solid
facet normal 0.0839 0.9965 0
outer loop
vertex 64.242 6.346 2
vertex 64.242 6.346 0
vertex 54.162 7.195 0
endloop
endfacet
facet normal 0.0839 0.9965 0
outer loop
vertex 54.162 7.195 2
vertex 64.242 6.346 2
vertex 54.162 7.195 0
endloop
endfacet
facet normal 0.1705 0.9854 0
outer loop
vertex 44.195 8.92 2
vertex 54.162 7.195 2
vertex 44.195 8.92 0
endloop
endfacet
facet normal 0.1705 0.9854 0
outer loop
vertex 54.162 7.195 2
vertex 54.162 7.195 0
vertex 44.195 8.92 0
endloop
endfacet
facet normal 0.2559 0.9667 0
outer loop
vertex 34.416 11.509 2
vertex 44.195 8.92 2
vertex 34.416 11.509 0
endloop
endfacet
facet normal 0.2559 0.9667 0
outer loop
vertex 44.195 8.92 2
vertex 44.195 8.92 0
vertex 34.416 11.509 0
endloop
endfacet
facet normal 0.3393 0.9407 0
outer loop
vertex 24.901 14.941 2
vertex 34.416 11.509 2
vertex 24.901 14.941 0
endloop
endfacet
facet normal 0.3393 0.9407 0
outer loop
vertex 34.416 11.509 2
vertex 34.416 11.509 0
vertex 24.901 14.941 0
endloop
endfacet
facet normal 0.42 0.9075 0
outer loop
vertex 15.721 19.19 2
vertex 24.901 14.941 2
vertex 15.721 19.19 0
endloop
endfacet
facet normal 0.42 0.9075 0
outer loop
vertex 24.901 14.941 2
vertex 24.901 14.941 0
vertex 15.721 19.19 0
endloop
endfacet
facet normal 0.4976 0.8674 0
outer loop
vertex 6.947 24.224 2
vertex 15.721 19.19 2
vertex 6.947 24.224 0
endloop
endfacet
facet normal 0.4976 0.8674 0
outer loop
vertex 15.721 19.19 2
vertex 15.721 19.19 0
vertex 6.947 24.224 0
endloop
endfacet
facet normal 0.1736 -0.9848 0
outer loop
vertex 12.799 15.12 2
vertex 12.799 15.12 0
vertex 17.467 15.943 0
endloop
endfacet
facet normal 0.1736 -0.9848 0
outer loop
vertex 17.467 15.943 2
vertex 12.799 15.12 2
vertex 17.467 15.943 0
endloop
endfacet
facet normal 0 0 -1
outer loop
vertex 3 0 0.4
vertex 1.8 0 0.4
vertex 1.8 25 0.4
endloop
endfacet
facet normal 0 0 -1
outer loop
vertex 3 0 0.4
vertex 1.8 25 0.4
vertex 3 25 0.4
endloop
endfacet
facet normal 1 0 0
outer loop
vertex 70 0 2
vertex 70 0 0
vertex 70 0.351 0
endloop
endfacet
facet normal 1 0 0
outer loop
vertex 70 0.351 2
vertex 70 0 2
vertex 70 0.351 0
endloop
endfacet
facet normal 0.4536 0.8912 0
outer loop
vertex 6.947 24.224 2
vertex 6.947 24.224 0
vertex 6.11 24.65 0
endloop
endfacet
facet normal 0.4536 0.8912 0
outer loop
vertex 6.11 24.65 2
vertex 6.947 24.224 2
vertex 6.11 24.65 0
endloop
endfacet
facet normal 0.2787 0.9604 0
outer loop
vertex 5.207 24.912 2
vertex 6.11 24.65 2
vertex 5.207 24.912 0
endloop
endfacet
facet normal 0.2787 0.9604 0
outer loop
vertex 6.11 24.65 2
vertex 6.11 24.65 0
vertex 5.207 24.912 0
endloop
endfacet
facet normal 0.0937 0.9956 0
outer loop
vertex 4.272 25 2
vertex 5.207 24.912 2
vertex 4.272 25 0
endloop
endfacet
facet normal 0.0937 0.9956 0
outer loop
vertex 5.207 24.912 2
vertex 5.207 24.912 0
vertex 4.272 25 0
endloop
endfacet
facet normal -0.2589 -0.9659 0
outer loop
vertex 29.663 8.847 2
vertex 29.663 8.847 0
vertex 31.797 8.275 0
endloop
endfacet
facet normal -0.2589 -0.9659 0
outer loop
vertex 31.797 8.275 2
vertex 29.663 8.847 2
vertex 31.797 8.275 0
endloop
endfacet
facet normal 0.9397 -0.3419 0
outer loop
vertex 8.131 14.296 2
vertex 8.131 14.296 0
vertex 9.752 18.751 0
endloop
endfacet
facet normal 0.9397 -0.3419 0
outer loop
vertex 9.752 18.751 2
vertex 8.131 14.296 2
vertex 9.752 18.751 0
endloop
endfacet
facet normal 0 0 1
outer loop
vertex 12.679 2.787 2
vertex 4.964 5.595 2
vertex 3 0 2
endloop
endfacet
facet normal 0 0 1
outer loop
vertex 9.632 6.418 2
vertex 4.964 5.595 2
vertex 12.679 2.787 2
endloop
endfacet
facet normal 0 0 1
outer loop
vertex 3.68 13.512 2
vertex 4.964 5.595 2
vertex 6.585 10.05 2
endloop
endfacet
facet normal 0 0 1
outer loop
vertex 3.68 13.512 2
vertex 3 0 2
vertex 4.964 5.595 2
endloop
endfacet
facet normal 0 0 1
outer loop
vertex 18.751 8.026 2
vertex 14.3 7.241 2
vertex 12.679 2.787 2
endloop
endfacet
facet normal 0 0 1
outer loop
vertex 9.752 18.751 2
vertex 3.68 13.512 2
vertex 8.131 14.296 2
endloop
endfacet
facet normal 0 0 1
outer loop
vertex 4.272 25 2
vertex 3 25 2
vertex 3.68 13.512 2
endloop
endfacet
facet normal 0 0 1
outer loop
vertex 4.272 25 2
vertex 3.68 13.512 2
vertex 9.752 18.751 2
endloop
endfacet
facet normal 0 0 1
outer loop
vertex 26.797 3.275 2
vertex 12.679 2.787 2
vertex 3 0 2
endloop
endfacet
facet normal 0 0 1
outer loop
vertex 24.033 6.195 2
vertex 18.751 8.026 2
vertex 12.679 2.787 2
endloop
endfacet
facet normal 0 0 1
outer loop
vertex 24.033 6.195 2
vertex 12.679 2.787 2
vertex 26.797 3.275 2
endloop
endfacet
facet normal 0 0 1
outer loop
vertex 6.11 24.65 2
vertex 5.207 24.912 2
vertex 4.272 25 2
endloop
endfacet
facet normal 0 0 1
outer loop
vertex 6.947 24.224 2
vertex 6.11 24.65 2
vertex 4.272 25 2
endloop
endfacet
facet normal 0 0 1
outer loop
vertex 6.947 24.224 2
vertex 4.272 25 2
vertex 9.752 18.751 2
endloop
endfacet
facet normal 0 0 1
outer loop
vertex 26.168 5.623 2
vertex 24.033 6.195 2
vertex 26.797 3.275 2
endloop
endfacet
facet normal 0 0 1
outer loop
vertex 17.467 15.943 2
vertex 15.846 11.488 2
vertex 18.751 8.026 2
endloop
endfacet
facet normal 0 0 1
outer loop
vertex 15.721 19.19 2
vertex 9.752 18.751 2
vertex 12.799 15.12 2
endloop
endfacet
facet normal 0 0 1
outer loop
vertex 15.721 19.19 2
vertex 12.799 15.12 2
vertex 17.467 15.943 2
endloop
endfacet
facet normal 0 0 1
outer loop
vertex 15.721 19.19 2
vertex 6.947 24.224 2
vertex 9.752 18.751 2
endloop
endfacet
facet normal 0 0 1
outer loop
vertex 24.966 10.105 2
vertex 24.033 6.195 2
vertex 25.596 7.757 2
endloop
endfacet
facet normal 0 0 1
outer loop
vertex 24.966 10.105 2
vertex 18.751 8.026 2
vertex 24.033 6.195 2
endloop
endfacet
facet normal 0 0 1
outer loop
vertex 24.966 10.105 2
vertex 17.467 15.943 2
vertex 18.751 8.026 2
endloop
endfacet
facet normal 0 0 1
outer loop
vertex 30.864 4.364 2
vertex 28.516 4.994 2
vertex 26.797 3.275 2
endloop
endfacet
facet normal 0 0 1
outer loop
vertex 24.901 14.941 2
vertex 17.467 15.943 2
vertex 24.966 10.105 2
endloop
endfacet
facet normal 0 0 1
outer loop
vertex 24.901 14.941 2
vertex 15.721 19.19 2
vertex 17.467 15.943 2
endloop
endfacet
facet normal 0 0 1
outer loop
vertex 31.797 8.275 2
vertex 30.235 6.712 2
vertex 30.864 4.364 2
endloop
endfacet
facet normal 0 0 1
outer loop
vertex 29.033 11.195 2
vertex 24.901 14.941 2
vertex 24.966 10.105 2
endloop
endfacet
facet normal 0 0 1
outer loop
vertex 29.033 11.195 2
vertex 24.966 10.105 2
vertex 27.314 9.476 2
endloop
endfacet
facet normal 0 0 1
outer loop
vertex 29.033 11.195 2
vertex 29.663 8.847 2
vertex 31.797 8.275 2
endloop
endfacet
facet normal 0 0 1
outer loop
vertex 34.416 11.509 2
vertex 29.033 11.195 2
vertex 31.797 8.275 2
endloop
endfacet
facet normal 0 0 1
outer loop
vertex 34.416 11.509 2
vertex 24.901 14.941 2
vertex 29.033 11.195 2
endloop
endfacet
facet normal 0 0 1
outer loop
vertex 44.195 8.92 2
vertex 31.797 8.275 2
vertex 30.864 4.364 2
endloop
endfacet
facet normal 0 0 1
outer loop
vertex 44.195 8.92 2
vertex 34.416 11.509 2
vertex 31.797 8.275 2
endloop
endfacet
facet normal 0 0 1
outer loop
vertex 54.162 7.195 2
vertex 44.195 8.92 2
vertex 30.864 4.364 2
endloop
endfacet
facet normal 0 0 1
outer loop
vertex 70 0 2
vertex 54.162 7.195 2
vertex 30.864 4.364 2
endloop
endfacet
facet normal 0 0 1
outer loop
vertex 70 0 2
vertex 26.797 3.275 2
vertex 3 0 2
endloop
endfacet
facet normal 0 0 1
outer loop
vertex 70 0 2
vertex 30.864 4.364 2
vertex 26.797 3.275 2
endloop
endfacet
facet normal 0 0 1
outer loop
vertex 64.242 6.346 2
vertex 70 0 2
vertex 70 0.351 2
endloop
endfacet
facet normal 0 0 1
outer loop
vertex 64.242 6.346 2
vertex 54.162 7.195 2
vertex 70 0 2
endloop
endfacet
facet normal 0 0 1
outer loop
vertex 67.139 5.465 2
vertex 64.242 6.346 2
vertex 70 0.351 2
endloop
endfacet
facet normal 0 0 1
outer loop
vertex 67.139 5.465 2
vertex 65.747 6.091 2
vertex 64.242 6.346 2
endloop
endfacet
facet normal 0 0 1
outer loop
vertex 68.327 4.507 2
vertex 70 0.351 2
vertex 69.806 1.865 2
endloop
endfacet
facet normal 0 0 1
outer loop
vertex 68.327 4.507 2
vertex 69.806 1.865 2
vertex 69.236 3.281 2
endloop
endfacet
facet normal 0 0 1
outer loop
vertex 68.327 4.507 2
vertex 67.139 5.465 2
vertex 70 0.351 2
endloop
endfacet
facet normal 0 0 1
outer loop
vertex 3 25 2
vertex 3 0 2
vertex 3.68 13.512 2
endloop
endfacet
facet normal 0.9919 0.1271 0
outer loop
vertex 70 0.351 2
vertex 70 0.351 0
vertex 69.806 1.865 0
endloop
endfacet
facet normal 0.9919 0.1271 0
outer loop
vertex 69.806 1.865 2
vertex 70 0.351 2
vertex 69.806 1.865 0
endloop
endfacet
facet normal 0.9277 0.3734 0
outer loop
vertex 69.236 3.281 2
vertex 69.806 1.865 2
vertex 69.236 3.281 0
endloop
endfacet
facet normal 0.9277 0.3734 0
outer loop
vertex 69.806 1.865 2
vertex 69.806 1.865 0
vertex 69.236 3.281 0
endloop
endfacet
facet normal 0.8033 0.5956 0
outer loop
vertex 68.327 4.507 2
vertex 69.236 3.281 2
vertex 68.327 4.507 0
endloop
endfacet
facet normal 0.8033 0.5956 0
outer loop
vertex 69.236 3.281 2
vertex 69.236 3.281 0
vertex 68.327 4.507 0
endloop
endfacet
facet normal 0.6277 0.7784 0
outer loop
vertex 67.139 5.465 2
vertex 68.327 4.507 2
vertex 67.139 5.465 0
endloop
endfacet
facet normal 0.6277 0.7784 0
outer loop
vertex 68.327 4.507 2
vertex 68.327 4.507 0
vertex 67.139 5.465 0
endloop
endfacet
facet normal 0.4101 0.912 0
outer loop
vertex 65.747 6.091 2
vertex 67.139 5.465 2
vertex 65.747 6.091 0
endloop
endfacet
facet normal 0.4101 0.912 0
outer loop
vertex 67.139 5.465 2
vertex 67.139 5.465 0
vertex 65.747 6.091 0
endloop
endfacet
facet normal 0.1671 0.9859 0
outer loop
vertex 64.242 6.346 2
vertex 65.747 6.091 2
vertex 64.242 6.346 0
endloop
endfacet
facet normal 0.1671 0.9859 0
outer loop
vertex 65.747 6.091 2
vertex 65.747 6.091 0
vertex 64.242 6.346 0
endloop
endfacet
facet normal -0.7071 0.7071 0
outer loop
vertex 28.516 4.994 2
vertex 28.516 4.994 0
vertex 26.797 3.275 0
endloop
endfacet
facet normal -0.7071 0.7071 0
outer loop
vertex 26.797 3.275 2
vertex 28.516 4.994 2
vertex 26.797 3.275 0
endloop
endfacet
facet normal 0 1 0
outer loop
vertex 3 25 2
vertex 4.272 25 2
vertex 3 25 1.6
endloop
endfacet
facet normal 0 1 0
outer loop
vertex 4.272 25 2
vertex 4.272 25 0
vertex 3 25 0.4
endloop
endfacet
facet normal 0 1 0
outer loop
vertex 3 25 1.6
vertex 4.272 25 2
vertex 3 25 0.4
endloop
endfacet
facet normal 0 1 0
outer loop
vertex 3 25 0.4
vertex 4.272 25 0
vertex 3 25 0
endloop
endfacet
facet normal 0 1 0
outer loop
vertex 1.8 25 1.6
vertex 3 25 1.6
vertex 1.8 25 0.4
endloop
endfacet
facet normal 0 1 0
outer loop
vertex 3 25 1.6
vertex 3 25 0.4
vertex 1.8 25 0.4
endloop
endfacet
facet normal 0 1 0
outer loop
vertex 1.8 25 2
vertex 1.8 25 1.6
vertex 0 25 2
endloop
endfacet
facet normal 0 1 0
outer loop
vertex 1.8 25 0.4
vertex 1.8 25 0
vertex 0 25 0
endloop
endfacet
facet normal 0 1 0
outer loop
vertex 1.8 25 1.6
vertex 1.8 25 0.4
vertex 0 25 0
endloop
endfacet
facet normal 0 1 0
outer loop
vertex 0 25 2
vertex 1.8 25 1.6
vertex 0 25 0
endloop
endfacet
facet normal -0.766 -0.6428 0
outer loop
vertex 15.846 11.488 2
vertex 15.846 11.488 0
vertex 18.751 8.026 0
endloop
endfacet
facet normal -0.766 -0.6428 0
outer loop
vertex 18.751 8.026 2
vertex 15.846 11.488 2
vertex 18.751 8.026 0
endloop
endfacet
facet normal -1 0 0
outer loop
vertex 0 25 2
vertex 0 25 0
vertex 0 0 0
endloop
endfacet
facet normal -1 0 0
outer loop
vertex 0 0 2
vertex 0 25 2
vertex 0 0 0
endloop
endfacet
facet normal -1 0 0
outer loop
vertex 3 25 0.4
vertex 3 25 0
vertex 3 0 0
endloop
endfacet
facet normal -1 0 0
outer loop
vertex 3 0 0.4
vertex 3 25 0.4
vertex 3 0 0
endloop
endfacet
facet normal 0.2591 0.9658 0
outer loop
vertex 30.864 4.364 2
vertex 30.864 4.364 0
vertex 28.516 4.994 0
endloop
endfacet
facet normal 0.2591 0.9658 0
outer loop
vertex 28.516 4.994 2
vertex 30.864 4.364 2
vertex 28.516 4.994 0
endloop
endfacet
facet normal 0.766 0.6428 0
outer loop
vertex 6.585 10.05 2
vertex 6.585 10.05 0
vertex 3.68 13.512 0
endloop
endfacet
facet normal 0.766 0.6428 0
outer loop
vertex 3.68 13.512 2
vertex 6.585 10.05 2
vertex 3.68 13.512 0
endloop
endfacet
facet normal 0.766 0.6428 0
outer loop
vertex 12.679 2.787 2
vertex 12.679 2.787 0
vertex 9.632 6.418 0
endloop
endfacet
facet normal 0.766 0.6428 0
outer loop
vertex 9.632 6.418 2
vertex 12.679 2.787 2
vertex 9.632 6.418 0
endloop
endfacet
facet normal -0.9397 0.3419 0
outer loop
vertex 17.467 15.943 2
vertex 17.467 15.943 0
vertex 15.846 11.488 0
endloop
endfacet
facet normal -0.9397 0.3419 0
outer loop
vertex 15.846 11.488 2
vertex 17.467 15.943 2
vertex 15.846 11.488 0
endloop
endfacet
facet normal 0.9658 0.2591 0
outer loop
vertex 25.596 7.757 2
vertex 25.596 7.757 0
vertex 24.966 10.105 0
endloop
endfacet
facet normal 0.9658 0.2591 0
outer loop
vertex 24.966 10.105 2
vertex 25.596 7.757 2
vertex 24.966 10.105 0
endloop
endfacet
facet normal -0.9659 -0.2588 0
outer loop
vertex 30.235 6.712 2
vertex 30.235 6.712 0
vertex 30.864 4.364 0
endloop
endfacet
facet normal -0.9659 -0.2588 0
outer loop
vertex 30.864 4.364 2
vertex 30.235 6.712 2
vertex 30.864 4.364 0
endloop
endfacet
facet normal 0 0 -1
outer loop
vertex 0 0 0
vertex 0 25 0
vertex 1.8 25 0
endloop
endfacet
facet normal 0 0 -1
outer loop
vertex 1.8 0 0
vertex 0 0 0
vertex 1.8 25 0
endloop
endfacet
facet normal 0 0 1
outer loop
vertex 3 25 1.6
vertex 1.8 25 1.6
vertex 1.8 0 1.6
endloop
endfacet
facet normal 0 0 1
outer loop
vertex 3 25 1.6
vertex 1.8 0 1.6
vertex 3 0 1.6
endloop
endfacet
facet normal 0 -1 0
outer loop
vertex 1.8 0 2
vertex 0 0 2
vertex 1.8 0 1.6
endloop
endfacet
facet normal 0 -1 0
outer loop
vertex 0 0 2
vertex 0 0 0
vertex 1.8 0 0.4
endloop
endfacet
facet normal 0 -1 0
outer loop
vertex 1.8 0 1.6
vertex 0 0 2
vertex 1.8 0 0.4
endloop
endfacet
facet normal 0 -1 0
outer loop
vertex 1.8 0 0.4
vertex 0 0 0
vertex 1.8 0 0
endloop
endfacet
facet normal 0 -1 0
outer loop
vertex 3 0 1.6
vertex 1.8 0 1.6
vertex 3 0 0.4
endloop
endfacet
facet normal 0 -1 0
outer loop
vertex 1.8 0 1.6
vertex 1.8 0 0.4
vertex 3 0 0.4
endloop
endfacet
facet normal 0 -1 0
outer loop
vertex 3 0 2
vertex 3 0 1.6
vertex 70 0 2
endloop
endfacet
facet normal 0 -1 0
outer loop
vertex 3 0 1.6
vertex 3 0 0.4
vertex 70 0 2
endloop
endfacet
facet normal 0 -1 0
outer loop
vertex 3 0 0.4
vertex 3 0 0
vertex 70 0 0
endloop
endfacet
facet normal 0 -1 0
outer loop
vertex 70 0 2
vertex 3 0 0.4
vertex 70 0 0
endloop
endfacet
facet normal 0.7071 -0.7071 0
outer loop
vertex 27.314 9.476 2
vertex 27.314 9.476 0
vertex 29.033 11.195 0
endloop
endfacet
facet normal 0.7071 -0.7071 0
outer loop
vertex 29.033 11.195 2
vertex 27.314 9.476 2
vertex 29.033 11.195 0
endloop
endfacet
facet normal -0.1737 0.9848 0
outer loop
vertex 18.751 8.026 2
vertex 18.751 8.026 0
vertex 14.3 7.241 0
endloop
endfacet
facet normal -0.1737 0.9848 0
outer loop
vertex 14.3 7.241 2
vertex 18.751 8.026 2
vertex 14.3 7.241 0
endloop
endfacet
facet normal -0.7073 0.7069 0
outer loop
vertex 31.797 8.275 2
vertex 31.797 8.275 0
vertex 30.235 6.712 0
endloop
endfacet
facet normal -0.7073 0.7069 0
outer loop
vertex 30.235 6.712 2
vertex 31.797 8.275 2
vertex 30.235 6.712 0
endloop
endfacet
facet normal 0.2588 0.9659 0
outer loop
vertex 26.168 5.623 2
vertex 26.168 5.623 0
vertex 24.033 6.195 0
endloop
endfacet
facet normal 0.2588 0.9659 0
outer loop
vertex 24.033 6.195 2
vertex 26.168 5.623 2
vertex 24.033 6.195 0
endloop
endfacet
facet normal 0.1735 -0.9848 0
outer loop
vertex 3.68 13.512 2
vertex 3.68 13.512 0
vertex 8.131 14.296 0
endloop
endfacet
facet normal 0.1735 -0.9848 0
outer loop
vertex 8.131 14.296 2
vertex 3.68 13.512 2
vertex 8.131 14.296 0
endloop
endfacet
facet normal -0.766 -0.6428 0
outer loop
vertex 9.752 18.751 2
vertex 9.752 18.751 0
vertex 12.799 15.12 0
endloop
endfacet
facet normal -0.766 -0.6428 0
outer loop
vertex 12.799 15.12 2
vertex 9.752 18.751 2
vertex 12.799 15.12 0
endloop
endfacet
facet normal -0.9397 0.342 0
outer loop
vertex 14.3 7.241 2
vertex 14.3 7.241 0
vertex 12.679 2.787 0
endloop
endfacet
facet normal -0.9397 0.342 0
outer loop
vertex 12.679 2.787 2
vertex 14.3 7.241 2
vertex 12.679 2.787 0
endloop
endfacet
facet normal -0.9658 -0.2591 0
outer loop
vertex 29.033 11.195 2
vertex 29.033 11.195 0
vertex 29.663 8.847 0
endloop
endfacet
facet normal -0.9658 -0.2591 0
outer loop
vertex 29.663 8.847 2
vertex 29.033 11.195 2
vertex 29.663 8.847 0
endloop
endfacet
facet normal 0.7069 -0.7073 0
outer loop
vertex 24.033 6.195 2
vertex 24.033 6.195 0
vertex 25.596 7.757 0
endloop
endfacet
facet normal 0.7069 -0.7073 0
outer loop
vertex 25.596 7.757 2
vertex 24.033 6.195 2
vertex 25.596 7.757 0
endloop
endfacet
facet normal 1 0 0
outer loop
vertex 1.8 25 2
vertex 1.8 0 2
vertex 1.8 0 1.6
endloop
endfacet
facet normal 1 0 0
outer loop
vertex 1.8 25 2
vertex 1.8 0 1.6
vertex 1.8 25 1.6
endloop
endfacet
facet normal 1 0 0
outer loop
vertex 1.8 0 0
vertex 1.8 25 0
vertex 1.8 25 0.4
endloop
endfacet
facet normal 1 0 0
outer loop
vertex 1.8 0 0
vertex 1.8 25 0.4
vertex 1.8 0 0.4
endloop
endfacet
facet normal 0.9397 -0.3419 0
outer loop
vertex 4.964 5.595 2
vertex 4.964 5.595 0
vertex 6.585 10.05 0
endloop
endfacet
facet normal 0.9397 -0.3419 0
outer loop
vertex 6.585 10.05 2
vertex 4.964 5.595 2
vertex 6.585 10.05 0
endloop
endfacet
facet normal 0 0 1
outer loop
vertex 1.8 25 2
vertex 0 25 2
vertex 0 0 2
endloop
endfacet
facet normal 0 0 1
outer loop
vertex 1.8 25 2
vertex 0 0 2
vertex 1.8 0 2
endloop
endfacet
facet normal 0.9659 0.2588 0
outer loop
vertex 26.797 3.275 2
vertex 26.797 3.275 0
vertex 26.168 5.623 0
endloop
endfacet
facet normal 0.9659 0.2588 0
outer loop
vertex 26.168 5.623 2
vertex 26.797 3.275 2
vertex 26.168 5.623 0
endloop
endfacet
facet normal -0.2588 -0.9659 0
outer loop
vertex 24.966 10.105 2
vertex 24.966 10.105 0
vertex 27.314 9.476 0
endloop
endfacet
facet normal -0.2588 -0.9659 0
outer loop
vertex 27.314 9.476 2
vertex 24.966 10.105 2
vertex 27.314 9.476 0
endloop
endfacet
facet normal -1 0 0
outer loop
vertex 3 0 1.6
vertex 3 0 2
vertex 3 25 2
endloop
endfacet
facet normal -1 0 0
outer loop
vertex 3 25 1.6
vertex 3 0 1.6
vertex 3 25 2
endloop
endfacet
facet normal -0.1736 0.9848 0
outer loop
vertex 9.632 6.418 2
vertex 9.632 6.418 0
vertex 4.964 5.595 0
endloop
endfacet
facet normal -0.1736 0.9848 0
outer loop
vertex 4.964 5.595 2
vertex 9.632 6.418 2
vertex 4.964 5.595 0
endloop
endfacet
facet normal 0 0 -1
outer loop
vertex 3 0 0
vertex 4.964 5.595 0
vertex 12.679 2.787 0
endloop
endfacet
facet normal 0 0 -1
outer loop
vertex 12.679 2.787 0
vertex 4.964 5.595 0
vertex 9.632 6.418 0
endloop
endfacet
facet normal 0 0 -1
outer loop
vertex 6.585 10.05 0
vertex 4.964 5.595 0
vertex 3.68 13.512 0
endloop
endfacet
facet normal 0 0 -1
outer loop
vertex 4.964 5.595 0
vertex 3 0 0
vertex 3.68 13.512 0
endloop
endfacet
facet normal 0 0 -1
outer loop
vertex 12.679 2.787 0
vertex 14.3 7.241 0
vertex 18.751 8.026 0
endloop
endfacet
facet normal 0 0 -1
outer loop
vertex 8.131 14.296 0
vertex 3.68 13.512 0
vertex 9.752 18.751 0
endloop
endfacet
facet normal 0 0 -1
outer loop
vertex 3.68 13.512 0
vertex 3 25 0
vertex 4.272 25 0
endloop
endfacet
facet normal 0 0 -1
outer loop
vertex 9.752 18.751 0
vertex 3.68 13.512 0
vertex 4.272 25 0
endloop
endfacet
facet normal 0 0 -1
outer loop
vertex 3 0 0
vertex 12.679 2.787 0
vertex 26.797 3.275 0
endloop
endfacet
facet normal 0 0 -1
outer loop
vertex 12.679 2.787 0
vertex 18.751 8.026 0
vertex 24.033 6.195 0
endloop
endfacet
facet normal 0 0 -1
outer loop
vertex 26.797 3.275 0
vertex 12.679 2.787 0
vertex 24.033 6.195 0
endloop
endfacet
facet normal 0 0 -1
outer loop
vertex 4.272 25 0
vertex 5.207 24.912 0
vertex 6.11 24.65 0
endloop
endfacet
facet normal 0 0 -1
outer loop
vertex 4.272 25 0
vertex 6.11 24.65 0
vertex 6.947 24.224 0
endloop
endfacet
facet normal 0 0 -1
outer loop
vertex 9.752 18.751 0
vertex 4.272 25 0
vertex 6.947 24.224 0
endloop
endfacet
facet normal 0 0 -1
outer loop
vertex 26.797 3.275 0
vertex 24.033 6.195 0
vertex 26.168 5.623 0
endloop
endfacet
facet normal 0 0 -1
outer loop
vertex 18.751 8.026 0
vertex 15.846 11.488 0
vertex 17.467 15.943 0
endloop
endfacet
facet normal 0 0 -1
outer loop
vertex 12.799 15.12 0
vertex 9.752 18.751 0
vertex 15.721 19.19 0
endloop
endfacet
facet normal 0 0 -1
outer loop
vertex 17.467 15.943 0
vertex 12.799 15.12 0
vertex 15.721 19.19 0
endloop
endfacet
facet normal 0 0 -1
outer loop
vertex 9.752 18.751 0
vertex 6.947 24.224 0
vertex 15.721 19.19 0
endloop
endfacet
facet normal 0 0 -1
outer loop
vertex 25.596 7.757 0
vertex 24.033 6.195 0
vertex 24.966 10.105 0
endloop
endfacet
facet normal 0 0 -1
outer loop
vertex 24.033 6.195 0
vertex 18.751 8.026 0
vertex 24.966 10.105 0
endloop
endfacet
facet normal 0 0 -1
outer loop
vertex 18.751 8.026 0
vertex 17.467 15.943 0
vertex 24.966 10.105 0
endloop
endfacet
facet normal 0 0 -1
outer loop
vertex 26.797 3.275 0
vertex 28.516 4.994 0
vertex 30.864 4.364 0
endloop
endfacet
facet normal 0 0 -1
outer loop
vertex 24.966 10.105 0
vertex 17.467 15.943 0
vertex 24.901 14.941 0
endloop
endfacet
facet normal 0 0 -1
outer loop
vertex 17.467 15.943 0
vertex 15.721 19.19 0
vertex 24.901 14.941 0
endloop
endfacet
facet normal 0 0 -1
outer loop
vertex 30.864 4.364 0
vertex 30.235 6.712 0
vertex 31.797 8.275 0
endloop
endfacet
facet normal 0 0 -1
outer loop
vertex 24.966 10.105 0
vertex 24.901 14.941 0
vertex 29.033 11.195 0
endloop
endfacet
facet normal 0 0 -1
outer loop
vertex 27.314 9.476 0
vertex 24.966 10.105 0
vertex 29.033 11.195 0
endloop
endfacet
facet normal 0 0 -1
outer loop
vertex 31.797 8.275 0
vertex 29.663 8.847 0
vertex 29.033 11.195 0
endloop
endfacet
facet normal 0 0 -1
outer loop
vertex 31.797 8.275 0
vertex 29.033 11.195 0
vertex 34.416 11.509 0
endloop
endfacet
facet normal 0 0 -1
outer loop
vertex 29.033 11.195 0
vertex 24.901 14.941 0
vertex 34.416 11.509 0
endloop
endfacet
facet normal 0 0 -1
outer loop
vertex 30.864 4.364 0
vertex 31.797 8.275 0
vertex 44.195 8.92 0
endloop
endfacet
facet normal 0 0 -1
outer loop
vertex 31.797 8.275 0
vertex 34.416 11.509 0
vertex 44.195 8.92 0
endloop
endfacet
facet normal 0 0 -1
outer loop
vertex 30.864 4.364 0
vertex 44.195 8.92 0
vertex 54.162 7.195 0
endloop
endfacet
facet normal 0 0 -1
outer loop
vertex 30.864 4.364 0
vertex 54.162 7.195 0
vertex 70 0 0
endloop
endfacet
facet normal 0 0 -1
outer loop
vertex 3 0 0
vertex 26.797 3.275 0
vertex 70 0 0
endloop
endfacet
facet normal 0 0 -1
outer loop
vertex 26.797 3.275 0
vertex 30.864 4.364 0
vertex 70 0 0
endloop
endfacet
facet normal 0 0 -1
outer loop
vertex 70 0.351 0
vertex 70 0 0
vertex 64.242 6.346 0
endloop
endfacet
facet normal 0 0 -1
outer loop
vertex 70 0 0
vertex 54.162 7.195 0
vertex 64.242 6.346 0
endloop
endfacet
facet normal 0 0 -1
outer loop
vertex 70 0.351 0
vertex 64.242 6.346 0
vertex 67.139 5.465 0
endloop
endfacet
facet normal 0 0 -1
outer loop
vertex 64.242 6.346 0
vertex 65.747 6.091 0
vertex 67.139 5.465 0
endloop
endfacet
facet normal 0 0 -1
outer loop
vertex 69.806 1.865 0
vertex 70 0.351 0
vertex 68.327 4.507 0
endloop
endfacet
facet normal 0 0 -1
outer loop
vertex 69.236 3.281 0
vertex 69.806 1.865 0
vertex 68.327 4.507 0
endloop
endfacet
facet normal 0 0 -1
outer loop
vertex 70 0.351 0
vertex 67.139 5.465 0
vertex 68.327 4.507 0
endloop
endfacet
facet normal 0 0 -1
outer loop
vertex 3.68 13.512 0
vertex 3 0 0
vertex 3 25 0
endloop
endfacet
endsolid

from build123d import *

# Parameters (mm, degrees)
F1_DEPTH = 2
F2_W     = 1.2
F2_H     = 25
F3_DEPTH = 0.4
F4_W     = 1.2
F4_H     = 25
F5_DEPTH = 0.4


with BuildPart() as f1:
    # F0 (on Top) → F1 (new body)
    with BuildSketch(Plane.XY):
        with BuildLine():
            Line((0, 25), (0, 0))
            Line((0, 0), (70, 0))
            Line((70, 0), (70, 0.351166))
            ThreePointArc((70, 0.351166), (68.327306, 4.507417), (64.24186, 6.34629))
            ThreePointArc((64.24186, 6.34629), (34.416213, 11.508745), (6.947288, 24.224025))
            ThreePointArc((6.947288, 24.224025), (5.664732, 24.802089), (4.271916, 25))
            Line((4.271916, 25), (0, 25))
        make_face()
        Polygon((12.798805, 15.11953), (17.467075, 15.942672), (15.845802, 11.488261), (18.750836, 8.026177), (14.300066, 7.241386), (12.678793, 2.786975), (9.631796, 6.418244), (4.963527, 5.595102), (6.5848, 10.049513), (3.679766, 13.511597), (8.130536, 14.296388), (9.751809, 18.750799), align=None, mode=Mode.SUBTRACT)
        Polygon((27.314466, 9.476318), (29.033361, 11.195212), (29.66252, 8.847159), (31.797244, 8.275161), (30.234517, 6.712435), (30.863677, 4.364381), (28.515623, 4.99354), (26.796728, 3.274646), (26.167569, 5.622699), (24.032845, 6.194697), (25.595572, 7.757423), (24.966413, 10.105477), align=None, mode=Mode.SUBTRACT)
    extrude(amount=F1_DEPTH)

    # F2 (on face) → F3 (cut)
    with BuildSketch(Plane.XY.offset(2)):
        with Locations((2.4, 12.5)):
            Rectangle(F2_W, F2_H)
    extrude(amount=-F3_DEPTH, mode=Mode.SUBTRACT)

    # F4 (on face) → F5 (cut)
    with BuildSketch(Plane(origin=(0, 0, 0), x_dir=(1, 0, 0), z_dir=(0, 0, -1))):
        with Locations((2.4, -12.5)):
            Rectangle(F4_W, F4_H)
    extrude(amount=-F5_DEPTH, mode=Mode.SUBTRACT)


solid = f1.part
